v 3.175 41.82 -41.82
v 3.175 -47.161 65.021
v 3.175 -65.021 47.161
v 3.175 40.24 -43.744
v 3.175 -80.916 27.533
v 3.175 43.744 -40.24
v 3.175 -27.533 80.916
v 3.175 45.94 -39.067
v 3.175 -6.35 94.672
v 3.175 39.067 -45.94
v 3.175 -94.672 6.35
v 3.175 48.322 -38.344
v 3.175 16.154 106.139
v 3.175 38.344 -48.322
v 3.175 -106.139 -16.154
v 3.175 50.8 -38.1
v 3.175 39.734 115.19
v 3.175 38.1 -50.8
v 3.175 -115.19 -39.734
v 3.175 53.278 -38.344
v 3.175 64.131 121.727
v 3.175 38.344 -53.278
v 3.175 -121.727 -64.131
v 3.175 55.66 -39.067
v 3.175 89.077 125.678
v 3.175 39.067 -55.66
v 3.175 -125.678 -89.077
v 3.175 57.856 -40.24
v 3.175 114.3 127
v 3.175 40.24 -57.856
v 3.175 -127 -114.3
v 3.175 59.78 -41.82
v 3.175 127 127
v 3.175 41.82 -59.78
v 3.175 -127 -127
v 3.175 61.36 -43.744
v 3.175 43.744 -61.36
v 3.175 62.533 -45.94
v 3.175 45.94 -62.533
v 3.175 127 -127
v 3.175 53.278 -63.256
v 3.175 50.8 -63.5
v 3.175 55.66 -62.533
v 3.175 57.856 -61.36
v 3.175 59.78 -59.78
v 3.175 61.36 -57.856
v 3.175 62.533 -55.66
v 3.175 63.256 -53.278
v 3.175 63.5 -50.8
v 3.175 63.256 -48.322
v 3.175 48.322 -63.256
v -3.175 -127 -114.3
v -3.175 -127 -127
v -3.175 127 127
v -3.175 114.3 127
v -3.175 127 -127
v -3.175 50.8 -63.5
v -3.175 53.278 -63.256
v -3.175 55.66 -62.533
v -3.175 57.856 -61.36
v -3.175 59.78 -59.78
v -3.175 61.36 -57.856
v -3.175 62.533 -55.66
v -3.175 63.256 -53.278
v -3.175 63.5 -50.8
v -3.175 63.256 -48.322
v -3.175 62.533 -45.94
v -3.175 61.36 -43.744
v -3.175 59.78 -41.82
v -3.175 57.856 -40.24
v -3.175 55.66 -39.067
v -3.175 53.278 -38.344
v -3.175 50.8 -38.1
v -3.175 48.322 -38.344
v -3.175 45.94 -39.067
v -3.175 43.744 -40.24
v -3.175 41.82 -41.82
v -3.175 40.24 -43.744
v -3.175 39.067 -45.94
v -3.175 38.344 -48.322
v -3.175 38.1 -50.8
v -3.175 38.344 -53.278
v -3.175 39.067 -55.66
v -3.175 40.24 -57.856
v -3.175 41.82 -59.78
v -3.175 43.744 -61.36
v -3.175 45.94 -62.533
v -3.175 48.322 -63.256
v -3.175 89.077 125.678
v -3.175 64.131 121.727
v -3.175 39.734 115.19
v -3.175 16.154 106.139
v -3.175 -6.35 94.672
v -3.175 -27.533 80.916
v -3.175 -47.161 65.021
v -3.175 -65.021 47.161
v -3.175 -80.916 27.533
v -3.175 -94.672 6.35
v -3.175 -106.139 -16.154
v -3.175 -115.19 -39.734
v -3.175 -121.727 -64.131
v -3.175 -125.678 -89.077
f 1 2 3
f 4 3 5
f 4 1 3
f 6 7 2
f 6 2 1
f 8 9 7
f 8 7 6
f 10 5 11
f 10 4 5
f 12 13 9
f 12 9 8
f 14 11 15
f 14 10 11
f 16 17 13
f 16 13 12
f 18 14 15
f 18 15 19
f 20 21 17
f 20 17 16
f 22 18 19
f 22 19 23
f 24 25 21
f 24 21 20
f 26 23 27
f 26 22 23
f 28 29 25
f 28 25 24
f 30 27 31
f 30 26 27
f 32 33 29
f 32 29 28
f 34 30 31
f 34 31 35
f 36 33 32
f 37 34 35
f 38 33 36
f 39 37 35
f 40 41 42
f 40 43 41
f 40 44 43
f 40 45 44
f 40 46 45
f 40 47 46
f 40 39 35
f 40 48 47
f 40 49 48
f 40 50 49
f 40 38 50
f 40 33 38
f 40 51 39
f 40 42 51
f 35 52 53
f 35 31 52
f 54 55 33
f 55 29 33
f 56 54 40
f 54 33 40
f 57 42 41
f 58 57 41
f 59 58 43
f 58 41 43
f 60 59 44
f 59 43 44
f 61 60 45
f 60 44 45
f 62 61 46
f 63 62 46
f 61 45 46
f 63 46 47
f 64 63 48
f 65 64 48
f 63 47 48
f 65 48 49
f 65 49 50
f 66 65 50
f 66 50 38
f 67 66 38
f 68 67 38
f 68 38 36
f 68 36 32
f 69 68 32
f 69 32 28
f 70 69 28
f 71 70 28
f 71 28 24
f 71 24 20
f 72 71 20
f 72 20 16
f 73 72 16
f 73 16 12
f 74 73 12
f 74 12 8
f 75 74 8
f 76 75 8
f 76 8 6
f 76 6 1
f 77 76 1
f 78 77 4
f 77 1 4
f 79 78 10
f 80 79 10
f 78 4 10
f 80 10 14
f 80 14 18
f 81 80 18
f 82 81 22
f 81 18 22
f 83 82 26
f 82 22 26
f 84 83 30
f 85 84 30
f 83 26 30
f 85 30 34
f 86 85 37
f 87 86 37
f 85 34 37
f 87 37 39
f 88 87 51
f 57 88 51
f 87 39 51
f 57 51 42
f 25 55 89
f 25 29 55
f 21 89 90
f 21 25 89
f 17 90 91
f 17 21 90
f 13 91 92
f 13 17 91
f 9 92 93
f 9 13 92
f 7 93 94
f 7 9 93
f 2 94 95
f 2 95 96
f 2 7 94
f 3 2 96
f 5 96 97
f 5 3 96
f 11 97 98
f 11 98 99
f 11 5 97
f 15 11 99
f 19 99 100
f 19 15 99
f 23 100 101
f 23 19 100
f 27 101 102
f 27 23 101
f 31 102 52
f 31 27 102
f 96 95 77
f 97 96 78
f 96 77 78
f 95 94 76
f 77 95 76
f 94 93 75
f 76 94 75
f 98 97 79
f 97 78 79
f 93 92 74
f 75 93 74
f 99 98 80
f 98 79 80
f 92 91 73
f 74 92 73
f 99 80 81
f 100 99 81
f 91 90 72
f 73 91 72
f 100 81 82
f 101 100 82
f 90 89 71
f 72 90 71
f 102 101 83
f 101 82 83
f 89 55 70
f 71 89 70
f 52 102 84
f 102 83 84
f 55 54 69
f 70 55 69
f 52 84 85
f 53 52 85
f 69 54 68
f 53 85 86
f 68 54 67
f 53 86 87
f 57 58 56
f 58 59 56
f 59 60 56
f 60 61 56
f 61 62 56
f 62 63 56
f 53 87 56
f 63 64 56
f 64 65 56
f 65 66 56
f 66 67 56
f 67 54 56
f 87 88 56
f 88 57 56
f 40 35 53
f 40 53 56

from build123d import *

# Parameters (mm, degrees)
SKETCH1_W           = 254
SKETCH1_H           = 254
BOSS_EXTRUDE1_DEPTH = 3.175
FILLET1_R           = 241.3
CUT_EXTRUDE1_REACH  = 8.35
SKETCH2_R           = 12.7


with BuildPart() as part:
    # Sketch1 → Boss-Extrude1 (new body, symmetric)
    with BuildSketch(Plane(origin=(0, 0, 0), x_dir=(0, 0, -1), z_dir=(1, 0, 0))):
        Rectangle(SKETCH1_W, SKETCH1_H)
    extrude(amount=BOSS_EXTRUDE1_DEPTH, both=True)

    # Fillet1
    fillet1_edges = [part.edges().sort_by_distance(p)[0] for p in [
        (0, -127, 127),
    ]]
    fillet(fillet1_edges, radius=FILLET1_R)

    # Sketch2 → Cut-Extrude1 (cut, up to next)
    with BuildSketch(Plane(origin=(3.175, 0, 0), x_dir=(0, 0, -1), z_dir=(1, 0, 0)), mode=Mode.PRIVATE) as cut_extrude1_sk1:
        with Locations((50.8, 50.8)):
            Circle(SKETCH2_R)
    cut_extrude1_tool1 = extrude(cut_extrude1_sk1.sketch, amount=-CUT_EXTRUDE1_REACH, mode=Mode.PRIVATE) & part.part
    add(cut_extrude1_tool1.solids().sort_by_distance((3.175, 50.8, -50.8))[0], mode=Mode.SUBTRACT)


solid = part.part
